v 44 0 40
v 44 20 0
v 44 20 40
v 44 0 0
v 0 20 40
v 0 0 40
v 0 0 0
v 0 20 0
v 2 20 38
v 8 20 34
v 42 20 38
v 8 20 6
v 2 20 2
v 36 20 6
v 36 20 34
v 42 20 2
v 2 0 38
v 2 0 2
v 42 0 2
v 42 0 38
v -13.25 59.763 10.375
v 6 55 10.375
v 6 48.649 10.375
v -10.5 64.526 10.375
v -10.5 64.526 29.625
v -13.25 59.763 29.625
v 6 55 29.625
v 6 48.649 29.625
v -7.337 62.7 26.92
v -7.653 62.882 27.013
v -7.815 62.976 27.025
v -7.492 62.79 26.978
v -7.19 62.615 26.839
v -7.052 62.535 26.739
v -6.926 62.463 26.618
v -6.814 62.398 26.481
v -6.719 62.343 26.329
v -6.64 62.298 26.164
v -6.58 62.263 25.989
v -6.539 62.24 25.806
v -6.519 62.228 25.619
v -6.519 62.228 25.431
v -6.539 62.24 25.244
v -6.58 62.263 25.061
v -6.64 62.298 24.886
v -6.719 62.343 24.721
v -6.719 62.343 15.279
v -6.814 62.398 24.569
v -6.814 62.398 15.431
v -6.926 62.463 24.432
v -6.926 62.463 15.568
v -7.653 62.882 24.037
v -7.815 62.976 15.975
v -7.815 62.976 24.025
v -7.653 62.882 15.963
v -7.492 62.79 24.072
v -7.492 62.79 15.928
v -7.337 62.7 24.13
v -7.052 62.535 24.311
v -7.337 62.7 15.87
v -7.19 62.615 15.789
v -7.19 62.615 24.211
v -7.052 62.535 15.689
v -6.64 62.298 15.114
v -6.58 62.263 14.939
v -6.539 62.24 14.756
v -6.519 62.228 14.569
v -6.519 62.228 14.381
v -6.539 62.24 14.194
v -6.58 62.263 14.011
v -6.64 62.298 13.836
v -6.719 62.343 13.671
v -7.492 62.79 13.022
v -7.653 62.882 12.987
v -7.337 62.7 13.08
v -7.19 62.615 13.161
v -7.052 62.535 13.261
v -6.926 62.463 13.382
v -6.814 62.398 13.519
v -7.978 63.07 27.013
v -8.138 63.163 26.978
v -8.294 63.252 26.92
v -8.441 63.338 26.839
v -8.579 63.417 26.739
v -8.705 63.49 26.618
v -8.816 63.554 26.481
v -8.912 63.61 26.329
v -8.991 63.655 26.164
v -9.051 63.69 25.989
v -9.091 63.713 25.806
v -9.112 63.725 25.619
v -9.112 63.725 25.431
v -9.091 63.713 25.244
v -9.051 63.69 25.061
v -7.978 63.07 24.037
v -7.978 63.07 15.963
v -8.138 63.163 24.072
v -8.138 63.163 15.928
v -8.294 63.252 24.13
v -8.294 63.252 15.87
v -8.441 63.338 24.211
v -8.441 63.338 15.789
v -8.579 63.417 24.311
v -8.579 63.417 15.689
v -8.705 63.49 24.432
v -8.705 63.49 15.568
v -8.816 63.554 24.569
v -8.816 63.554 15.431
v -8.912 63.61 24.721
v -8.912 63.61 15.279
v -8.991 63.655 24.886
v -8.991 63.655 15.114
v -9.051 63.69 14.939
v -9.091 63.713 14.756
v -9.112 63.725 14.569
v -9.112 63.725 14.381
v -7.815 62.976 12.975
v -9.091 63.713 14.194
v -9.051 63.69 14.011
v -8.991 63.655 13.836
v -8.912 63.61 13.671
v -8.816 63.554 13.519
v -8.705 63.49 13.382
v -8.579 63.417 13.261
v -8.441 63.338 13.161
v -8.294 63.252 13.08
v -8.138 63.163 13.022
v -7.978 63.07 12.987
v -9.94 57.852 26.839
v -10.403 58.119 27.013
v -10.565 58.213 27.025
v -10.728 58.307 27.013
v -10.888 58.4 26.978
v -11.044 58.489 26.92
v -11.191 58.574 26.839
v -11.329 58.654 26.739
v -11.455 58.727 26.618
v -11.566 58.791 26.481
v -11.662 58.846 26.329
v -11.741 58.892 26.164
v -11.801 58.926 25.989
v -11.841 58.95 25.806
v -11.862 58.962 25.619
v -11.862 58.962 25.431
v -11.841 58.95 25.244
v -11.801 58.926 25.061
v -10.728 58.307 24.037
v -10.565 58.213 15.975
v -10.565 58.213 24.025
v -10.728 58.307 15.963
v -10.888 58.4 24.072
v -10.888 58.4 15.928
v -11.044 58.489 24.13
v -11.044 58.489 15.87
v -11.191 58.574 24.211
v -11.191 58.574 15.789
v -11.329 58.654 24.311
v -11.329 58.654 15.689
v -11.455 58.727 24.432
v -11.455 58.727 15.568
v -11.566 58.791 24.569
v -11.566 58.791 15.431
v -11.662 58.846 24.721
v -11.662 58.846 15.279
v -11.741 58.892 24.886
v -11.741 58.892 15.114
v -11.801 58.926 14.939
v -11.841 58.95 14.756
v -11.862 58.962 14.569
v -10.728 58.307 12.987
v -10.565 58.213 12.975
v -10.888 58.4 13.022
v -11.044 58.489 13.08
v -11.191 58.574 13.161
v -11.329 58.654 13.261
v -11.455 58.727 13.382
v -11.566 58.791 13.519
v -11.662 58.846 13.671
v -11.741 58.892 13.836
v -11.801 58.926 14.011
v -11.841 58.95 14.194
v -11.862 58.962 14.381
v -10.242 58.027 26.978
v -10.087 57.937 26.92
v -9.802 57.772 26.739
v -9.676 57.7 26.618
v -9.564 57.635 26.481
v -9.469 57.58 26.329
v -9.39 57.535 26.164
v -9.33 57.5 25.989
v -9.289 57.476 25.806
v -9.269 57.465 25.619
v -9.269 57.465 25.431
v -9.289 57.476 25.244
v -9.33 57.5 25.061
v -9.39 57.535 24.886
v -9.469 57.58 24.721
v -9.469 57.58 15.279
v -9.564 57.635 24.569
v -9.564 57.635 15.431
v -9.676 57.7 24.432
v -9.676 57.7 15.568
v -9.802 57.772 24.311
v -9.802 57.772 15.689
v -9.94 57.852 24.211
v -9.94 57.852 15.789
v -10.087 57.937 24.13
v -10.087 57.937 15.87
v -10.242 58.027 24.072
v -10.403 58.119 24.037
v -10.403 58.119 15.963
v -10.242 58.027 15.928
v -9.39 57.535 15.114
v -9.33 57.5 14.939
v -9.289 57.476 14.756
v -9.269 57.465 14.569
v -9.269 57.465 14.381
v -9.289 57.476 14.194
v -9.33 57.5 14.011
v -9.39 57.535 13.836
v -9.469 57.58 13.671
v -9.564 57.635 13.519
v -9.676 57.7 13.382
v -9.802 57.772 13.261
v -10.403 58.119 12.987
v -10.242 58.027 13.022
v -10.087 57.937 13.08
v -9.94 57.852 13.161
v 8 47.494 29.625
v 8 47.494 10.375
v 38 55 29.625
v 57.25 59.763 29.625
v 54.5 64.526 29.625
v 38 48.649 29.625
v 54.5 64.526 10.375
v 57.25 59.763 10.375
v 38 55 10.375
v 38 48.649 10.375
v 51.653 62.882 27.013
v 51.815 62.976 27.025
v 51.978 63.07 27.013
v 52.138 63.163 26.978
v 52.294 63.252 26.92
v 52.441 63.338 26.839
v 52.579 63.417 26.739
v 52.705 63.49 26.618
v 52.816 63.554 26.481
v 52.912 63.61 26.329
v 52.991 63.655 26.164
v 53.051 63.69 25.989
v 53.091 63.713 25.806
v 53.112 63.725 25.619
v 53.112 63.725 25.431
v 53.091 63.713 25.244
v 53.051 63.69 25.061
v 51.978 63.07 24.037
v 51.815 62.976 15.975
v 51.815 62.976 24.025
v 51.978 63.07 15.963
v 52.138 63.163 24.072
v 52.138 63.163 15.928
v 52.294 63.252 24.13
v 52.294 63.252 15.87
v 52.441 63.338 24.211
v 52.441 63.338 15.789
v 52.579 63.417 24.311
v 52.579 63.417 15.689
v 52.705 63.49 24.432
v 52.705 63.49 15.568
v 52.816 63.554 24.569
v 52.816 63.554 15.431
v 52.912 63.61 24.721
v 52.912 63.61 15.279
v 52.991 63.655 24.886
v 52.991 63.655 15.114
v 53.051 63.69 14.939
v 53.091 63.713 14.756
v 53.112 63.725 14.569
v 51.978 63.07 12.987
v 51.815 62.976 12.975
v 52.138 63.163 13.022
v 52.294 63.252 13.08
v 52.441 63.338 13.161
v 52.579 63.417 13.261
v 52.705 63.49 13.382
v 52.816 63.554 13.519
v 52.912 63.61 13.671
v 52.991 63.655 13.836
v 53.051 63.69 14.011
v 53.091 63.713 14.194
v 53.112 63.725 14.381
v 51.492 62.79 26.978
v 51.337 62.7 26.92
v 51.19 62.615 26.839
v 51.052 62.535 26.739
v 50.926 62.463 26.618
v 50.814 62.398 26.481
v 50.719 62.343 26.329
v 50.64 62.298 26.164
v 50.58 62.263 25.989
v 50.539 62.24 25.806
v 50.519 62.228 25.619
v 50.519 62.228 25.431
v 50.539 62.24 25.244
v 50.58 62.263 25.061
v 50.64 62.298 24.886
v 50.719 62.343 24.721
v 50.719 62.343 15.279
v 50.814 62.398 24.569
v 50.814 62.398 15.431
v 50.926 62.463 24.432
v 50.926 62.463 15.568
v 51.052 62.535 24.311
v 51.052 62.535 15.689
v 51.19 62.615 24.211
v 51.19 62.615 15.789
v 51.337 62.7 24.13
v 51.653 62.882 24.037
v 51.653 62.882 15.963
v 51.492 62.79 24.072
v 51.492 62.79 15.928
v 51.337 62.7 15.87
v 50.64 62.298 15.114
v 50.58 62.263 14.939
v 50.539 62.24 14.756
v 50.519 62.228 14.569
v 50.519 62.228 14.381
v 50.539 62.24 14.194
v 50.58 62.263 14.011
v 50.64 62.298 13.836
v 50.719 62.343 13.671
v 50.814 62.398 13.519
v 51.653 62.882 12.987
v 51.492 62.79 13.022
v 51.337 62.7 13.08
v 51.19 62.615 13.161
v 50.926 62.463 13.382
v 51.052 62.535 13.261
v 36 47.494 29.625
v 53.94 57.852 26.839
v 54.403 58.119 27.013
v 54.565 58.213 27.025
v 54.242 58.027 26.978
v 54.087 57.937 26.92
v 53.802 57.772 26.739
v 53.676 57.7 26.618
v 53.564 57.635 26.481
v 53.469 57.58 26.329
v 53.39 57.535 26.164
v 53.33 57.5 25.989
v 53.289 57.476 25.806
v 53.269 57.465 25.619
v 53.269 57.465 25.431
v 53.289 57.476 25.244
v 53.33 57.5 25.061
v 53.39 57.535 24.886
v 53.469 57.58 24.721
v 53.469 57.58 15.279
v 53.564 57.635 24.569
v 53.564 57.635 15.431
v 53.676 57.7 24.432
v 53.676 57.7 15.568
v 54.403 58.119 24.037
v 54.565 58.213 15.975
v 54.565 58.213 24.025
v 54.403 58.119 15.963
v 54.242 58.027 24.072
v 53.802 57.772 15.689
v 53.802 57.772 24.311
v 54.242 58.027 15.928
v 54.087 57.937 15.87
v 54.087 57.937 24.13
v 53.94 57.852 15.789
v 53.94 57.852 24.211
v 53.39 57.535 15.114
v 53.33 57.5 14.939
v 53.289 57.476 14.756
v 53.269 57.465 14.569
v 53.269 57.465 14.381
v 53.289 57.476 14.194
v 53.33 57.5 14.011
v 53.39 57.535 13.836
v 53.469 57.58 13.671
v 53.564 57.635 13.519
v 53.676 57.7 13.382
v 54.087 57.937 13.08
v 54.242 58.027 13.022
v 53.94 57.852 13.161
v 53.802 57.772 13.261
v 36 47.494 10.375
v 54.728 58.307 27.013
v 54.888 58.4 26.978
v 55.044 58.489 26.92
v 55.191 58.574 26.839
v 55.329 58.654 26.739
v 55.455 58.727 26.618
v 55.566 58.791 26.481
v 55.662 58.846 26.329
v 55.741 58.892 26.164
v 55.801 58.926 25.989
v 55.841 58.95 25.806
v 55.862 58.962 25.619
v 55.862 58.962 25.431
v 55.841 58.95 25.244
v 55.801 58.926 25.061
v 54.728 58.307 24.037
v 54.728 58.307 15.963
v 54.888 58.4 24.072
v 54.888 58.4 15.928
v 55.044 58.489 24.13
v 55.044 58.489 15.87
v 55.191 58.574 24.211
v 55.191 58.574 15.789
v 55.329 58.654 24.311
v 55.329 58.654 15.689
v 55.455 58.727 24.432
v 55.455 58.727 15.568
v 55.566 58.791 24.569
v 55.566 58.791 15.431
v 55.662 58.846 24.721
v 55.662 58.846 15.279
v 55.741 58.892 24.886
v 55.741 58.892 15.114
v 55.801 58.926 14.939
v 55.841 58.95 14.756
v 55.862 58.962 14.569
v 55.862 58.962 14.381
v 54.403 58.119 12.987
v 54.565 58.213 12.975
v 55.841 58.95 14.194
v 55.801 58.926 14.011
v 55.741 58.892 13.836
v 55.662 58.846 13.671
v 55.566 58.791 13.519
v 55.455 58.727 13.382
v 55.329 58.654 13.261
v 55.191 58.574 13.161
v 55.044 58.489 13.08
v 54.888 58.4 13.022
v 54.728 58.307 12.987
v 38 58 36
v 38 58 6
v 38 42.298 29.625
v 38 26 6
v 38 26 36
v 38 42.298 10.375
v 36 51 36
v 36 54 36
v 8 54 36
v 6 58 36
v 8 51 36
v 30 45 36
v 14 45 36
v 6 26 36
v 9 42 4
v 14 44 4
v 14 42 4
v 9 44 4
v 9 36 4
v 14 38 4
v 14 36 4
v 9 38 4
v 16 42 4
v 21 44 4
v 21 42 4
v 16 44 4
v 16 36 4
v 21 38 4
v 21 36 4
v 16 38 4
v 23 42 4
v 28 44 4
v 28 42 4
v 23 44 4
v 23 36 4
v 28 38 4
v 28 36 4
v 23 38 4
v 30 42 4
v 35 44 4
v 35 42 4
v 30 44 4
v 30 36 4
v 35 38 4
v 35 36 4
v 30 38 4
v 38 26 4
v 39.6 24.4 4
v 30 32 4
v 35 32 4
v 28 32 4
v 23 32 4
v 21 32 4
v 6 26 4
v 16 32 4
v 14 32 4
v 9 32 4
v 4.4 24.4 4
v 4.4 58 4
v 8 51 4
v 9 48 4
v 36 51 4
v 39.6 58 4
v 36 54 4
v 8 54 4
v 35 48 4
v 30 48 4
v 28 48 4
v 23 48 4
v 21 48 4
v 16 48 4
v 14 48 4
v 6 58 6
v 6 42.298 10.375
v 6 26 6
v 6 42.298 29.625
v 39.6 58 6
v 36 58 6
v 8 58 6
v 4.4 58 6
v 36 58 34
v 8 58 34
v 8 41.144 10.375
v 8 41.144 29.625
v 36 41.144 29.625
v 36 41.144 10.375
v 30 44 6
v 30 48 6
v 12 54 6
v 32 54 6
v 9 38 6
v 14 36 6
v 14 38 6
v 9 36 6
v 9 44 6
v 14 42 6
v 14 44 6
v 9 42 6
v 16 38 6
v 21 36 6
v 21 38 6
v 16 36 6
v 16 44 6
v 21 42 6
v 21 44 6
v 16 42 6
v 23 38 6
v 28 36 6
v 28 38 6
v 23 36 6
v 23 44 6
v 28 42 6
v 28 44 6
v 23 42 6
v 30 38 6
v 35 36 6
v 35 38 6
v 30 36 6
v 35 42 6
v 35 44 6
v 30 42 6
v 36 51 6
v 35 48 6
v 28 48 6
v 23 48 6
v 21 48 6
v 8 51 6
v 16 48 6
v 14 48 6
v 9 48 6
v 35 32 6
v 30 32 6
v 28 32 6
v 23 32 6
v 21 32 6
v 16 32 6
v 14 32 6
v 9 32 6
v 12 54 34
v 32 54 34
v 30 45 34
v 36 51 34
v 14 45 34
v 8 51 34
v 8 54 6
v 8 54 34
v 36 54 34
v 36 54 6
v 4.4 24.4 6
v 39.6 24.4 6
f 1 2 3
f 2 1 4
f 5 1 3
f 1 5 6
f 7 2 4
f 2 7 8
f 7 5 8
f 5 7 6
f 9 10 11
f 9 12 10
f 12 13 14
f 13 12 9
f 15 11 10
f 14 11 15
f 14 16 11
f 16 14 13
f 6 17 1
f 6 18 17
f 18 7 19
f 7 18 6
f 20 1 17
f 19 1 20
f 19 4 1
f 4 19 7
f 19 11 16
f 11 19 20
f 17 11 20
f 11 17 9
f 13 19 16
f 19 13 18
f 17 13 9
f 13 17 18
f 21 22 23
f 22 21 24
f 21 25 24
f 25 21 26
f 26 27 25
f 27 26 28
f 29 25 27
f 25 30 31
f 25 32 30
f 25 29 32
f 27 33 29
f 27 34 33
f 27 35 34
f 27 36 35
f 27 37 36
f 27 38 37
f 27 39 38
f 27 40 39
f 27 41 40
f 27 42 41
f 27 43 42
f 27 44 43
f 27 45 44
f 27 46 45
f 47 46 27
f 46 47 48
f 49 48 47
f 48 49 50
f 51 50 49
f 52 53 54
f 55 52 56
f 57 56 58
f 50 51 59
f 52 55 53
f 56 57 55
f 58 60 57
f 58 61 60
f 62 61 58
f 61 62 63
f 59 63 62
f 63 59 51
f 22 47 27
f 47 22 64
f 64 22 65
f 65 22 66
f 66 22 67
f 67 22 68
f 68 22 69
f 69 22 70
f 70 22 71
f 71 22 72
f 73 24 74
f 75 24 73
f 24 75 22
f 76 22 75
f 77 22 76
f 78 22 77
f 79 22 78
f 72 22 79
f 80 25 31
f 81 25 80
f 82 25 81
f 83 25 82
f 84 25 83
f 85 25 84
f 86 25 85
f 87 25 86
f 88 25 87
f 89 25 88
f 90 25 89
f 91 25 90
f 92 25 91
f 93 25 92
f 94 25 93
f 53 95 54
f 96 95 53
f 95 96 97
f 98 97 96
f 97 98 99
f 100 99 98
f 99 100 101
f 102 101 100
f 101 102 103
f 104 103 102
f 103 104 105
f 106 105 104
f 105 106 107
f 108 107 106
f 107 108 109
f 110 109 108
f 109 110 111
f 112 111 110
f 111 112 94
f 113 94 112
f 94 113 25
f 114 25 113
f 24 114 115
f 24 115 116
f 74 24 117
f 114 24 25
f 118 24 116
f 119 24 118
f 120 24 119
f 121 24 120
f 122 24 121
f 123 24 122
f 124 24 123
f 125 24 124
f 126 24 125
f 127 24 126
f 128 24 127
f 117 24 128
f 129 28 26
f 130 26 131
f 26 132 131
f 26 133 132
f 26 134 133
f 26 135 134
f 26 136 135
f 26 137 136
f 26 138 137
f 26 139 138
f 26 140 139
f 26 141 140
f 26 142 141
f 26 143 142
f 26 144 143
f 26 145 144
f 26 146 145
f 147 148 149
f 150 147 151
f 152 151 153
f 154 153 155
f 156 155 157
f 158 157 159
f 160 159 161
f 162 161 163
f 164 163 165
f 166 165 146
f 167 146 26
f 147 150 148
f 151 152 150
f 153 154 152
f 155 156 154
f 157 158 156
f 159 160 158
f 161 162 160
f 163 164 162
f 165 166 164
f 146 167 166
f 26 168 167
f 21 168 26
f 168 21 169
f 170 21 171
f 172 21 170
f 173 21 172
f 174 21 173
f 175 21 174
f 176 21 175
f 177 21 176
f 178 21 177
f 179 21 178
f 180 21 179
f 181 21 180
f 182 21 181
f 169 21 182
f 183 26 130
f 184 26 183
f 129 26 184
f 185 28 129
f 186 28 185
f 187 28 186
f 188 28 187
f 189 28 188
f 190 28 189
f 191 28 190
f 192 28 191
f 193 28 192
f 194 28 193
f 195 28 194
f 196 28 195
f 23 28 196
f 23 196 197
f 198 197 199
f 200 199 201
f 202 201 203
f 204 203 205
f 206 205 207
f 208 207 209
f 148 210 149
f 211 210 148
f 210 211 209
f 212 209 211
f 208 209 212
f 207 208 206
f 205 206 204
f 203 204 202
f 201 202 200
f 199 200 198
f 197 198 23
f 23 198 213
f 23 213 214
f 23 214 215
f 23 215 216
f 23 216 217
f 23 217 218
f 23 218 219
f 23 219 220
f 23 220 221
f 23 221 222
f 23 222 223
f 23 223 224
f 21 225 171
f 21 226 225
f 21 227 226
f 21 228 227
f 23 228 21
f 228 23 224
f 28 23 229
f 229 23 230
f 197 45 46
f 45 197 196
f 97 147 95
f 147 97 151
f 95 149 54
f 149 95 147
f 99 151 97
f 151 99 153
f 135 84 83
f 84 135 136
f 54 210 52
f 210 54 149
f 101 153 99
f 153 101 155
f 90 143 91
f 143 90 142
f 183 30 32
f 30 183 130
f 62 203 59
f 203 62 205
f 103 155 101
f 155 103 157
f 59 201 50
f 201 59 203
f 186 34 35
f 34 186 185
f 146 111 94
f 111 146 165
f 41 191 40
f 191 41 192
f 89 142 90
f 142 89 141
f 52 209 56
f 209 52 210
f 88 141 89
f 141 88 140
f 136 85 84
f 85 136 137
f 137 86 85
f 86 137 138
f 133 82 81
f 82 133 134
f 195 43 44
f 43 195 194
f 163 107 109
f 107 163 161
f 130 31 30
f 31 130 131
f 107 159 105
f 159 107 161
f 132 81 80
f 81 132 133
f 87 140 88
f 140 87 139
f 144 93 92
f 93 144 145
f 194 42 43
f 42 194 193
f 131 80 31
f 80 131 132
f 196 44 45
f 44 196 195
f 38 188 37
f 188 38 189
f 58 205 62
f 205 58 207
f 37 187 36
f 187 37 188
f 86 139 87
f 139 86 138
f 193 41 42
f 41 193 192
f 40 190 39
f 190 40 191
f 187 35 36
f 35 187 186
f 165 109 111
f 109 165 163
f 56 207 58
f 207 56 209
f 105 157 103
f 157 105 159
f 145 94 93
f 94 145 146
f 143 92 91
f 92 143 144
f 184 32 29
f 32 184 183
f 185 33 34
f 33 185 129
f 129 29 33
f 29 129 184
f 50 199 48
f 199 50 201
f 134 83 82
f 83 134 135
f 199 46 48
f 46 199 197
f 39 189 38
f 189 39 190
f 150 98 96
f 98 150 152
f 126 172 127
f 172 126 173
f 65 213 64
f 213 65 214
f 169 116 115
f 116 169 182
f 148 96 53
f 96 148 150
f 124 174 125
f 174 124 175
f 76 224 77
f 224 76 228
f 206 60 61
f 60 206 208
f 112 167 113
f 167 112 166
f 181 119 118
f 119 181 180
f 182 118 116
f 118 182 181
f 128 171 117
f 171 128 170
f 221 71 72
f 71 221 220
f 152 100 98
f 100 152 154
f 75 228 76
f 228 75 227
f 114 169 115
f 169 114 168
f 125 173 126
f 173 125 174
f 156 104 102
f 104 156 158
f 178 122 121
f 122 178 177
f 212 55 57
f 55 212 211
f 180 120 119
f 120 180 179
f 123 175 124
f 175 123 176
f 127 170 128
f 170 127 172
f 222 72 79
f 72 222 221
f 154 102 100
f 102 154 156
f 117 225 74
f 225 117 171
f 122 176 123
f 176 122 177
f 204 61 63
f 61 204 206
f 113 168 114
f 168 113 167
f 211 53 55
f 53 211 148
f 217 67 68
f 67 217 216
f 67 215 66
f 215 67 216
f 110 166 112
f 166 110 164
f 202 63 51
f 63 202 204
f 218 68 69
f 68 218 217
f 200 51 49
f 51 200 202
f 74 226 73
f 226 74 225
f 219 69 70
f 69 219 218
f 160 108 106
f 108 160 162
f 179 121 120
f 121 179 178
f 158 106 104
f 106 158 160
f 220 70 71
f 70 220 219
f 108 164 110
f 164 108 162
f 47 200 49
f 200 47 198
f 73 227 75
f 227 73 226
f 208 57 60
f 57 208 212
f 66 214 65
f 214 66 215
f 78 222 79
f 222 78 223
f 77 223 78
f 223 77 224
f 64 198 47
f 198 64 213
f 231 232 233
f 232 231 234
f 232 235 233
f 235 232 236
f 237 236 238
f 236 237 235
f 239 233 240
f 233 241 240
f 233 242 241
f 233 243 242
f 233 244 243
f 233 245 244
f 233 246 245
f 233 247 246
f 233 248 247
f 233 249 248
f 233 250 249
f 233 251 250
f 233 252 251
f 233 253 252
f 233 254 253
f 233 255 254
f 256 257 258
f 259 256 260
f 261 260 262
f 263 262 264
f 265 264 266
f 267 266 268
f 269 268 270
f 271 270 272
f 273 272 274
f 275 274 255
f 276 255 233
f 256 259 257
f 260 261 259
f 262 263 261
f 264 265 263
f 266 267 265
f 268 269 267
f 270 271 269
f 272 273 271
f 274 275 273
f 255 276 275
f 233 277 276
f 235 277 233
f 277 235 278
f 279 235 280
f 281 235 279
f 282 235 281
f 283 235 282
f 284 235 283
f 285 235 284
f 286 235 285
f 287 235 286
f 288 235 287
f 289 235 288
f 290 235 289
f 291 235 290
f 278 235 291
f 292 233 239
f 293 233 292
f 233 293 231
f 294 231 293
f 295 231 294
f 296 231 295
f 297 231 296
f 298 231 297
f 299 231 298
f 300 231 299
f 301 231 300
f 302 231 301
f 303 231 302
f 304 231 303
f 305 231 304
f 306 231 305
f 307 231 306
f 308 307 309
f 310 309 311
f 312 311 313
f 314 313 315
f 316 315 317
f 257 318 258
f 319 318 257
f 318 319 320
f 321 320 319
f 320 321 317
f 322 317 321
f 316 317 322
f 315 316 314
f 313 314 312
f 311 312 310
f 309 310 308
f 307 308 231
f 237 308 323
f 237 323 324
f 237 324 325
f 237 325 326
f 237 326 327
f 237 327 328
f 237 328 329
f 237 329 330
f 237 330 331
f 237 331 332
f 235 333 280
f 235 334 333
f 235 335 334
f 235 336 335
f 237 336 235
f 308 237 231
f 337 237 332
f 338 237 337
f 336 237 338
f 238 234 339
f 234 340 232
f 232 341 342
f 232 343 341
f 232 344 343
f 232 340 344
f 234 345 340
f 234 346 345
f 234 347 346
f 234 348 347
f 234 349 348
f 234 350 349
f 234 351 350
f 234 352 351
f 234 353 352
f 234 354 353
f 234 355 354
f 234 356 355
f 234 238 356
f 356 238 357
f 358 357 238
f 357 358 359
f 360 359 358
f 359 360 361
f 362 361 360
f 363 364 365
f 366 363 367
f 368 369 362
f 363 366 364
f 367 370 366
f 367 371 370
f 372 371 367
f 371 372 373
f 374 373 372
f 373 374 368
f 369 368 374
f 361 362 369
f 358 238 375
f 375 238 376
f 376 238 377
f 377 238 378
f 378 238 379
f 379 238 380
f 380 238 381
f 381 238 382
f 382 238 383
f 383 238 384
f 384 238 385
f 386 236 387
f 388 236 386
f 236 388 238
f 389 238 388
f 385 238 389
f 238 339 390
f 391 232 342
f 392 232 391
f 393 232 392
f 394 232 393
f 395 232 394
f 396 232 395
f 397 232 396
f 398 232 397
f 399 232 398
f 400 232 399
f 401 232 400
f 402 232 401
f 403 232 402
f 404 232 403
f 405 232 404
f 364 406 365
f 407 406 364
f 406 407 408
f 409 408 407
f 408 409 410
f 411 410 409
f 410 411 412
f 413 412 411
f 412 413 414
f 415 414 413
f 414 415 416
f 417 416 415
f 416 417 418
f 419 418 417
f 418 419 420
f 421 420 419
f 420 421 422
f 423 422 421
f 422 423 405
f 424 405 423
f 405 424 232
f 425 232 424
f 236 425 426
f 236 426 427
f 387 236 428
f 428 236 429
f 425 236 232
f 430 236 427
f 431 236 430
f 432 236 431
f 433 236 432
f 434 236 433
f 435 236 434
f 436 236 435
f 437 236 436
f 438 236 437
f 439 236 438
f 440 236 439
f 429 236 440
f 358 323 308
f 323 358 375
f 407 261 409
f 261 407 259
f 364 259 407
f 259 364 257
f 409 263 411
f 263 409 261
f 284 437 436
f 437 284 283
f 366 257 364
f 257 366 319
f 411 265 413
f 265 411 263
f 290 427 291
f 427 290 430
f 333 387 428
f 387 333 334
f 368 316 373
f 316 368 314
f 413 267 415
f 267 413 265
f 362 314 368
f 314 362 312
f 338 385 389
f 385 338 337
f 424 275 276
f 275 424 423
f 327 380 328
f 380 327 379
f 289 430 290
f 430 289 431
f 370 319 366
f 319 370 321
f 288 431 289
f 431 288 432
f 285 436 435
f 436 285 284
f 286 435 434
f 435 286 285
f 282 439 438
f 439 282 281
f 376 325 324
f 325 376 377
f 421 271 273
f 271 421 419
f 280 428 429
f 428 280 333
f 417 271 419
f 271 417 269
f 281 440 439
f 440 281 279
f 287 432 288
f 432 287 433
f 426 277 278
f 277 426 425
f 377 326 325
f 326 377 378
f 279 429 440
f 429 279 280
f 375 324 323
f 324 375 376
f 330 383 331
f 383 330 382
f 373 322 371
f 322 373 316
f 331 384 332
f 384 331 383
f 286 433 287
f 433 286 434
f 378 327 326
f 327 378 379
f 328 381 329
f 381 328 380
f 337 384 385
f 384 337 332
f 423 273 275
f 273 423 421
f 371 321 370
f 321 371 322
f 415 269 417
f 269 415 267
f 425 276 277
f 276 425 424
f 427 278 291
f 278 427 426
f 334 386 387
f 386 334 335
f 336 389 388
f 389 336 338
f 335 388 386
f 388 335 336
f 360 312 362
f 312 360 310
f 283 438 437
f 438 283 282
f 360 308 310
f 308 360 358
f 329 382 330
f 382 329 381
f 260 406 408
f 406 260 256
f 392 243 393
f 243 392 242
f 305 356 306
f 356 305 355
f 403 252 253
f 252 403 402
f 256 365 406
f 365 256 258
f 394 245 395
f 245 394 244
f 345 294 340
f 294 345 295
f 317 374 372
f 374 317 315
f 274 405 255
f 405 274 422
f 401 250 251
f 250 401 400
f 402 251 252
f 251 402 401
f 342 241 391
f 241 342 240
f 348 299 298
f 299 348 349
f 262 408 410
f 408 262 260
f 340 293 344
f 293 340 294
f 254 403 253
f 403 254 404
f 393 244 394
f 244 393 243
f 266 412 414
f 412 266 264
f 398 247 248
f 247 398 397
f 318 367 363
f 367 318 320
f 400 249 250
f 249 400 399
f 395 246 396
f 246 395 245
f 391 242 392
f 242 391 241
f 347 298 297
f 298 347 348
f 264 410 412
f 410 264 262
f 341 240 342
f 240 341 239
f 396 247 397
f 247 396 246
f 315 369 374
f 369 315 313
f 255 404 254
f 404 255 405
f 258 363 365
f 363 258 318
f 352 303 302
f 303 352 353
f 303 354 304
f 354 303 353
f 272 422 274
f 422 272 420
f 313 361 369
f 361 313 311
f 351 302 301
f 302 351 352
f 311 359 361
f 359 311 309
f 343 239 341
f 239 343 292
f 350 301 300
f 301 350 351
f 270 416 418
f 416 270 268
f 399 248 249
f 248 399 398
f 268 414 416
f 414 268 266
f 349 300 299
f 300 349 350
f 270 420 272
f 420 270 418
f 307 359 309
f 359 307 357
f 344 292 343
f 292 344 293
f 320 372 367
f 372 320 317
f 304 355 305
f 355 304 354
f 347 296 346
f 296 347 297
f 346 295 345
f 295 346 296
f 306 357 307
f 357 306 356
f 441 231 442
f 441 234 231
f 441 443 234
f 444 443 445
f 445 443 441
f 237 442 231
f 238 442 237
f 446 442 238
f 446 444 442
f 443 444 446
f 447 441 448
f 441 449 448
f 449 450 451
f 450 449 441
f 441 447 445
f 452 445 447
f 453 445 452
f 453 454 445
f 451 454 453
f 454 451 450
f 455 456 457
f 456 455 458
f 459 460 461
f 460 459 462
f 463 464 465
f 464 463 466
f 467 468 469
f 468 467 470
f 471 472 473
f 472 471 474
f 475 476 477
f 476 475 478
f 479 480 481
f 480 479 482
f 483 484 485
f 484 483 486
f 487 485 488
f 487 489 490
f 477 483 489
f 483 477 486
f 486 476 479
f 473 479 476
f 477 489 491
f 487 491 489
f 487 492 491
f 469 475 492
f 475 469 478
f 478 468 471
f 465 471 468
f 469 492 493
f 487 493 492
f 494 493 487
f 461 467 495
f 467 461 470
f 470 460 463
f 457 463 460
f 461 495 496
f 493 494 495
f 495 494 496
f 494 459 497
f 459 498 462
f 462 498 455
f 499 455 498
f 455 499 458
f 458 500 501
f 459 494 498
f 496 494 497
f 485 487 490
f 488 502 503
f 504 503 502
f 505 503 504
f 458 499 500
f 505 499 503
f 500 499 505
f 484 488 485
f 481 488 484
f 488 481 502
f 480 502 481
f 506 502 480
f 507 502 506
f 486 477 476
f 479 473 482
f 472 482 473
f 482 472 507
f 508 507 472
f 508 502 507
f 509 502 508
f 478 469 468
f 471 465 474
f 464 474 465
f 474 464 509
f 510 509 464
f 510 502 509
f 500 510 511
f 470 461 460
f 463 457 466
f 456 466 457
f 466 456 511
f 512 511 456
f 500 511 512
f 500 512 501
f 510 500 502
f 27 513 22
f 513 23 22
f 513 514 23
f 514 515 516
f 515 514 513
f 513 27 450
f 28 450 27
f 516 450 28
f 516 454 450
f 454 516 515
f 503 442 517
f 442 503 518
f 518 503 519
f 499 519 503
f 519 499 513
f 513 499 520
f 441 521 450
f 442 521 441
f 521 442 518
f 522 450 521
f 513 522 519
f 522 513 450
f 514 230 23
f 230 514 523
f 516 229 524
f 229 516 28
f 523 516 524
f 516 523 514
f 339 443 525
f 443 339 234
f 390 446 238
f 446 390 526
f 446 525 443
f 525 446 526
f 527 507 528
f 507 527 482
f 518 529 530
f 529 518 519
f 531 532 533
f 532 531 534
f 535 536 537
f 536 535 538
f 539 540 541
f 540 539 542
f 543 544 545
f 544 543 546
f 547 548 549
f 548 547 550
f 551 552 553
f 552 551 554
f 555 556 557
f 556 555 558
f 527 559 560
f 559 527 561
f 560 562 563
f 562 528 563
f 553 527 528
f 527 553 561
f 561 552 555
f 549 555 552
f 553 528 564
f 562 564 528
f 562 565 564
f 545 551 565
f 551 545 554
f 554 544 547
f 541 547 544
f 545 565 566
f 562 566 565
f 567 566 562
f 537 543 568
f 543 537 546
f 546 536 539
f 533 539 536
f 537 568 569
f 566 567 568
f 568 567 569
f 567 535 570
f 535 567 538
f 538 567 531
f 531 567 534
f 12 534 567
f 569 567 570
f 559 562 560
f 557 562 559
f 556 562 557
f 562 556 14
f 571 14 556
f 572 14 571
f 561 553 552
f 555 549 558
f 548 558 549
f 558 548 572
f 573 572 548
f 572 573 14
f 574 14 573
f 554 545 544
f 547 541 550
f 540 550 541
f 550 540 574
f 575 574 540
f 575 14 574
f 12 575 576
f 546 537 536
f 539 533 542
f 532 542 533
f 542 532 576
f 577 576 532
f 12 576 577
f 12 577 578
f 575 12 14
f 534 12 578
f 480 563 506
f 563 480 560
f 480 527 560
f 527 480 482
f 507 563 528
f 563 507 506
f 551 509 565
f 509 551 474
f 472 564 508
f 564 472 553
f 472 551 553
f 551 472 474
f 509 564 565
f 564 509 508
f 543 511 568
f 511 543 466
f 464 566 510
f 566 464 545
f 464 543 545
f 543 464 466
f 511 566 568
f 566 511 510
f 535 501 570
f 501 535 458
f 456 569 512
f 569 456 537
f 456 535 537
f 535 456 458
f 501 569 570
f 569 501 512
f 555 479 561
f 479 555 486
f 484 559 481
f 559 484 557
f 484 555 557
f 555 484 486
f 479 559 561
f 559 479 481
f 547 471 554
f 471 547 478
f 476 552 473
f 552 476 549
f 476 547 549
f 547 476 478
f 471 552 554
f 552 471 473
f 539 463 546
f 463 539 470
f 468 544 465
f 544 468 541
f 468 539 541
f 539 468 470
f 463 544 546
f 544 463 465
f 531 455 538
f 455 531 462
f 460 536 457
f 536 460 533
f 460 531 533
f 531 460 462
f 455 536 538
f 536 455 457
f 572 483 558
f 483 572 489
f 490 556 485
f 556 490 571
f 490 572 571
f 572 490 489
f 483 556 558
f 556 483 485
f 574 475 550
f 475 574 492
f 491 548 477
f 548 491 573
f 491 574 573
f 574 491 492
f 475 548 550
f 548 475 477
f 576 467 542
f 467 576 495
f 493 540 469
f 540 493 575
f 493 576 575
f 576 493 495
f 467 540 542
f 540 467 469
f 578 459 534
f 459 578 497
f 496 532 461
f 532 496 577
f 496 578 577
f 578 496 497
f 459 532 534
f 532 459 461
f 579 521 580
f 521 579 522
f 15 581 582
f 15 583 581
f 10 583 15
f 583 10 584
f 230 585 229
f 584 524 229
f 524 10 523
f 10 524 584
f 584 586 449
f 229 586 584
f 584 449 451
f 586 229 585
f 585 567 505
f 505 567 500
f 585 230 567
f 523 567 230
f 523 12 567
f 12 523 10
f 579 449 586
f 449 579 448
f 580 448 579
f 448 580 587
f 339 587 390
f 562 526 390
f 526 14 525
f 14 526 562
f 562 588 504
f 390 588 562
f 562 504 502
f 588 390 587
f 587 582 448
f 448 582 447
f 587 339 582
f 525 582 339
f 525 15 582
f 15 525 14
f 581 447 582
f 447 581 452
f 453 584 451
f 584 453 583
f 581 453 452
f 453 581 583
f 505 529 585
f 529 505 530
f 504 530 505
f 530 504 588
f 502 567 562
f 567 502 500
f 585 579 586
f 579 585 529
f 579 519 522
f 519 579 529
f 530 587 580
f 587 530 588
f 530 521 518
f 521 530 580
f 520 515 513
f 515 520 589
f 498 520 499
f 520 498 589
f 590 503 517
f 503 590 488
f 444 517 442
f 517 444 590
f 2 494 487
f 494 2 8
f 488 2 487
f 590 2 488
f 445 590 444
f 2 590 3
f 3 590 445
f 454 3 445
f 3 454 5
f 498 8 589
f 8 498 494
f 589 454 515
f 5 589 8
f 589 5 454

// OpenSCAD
 //Variables
$fn = 50;
cube_design = "corpus_brush"; //corpus, corpus_brush, darkener or funnel
grid_pattern = "squares"; //squares, squares2 (rotated by 45°)
plexi_cube_width = 39; //39 for cube1, 32 for cube2
plexi_cube_length = 35; //35 for cube1, 30 for cube2
plexi_cube_depth_overall = 30;
darkener_overhang = 10;
plexi_cube_depth = 20; //this is for the main corpus
plexi_cube_thickness = 2;
plexi_cube_buffer = 0.5; //1mm room in every direction
insert_bar_height = 6; //needs to be the same as in the insert creator
insert_bar_length = 16; //needs to be the same as in the insert creator
insert_base_length = 28; //needs to be the same as "base plate length upper" in the insert creator
insert_thickness = 2; //needs to be the same as "base plate thickness" in the insert creator
insert_buffer = 1;
insert_distance_from_tube_end = 4; //dont change this

tube_thickness = 2;

tube_width = 28;
tube_length = 28;
tube_depth = 32; // was 38.5, for normal design 25.5, increase for brush
tube_count = 1; //number of tubes

security_bar_width = 4; //dont change this

slide_bar_length = tube_depth+2;
slide_bar_width = 1.6; //decreased from 2 to 1,6 for buffer
slide_bar_height = 2;
//if square grid pattern

square_width = 5;
square_length = 4;
square_distance = 2;
number_squares_per_row = 4;
number_squares_per_column = 3; // normal 2, brush probably 3

funnel_slide_width = 4;
funnel_slide_height = 7;
funnel_slide_hollow_height = 3;
funnel_slide_buffer_width = 0.2;
funnel_pyramid_length = 32;
funnel_pyramid_tip_height = 18;
funnel_tip_cube_width = 14;
funnel_tip_cube_length = 14;
funnel_tip_cube_height = 11;
funnel_hollow_cylinder_height = 20;
funnel_hollow_cylinder_diameter = 7;

brush_head_length = 16;
brush_bottom_length = 24;
brush_width = 19.25;
brush_thickness = 5.5;
distance_hole_from_top = 1.6;
distance_hole_from_side = 2.6;
diameter = 3;


//angle
tube_distance_left = (plexi_cube_width/2+plexi_cube_buffer+plexi_cube_thickness-tube_width/2-tube_thickness);
tube_distance_bottom = (plexi_cube_length/2+plexi_cube_buffer+plexi_cube_thickness-tube_length/2-tube_thickness);
angle_depth = max(tube_distance_left, tube_distance_bottom);
outer_cube_width = plexi_cube_width + 2*plexi_cube_thickness + 2*plexi_cube_buffer;
outer_cube_length = plexi_cube_length + 2*plexi_cube_thickness + 2*plexi_cube_buffer;

//module to create triangles
module triangle(width,length,height){
    difference(){
        cube([width,length,height]);
        rotate([0,0,45]) cube([width*2.5,length*2.5,height*5]);
    }
}

//module to show points of a polyhedron
module showPoints(v) {
    for (i = [0: len(v)-1]) {
        translate(v[i]) color("red") 
        text(str(i), font = "Courier New", size=1.5);
         
    }
}

//module to create a square grid pattern
module square_grid(){
    grid_width = square_width*number_squares_per_row + square_distance*(number_squares_per_row-1);
    grid_length = square_length*number_squares_per_column + square_distance*(number_squares_per_column-1);
translate([tube_width/2+tube_thickness-grid_width/2,tube_depth+angle_depth-(insert_distance_from_tube_end+insert_thickness+insert_buffer+insert_bar_height)+3,0])
translate([grid_width,0,0])
rotate([0,0,180])
for (j=[0:number_squares_per_column-1]){
for (i=[0:number_squares_per_row-1]){
    translate([i*(square_distance+square_width),j*(square_distance+square_length),0])cube([square_width,square_length,tube_thickness]);
    }
}
}

module square_grid2(){
    grid_width = square_width*number_squares_per_row + square_distance*(number_squares_per_row-1);
    grid_length = square_length*number_squares_per_column + square_distance*(number_squares_per_column-1);
translate([tube_width/2+tube_thickness-grid_width/2,tube_depth+angle_depth-(insert_distance_from_tube_end+insert_thickness+insert_buffer+insert_bar_height),0])
translate([grid_width-square_length/2,0,0])
rotate([0,0,180])
for (j=[0:number_squares_per_column-1]){
for (i=[0:number_squares_per_row-1]){
    translate([i*(square_distance+square_width),j*(square_distance+square_length),0])rotate([0,0,45])cube([square_width,square_length,tube_thickness]);
    }
}
}

//module to create a brush as a standin
module brush (){
difference(){
union(){
color("green")cube([brush_width, brush_thickness, brush_head_length]);
color("brown")translate([0,0,brush_head_length])cube([brush_width, brush_thickness, brush_bottom_length]);
}

union(){
translate([diameter/2+distance_hole_from_side,0,diameter/2 + distance_hole_from_top])rotate([270,0,0])cylinder(h=brush_thickness, d=diameter);
translate([brush_width-diameter/2-distance_hole_from_side,0,diameter/2 + distance_hole_from_top])rotate([270,0,0])cylinder(h=brush_thickness, d=diameter);
}
}
}

//module to create a mount for the brush
module brush_mount (){
difference(){
union(){
color("green")cube([brush_width, brush_thickness, brush_head_length]);
color("brown")translate([0,0,brush_head_length])cube([brush_width, brush_thickness, brush_bottom_length]);
}

union(){
translate([diameter/2+distance_hole_from_side,0,diameter/2 + distance_hole_from_top])rotate([270,0,0])cylinder(h=brush_thickness, d=diameter);
translate([brush_width-diameter/2-distance_hole_from_side,0,diameter/2 + distance_hole_from_top])rotate([270,0,0])cylinder(h=brush_thickness, d=diameter);
}
}
}


if (cube_design == "corpus"){
union(){

//plexi_cube part of the tube
difference(){
    cube([plexi_cube_width + 2*plexi_cube_thickness + 2*plexi_cube_buffer, plexi_cube_depth, plexi_cube_length+2*plexi_cube_thickness + 2*plexi_cube_buffer]);
    translate([plexi_cube_thickness,0,plexi_cube_thickness])cube([plexi_cube_width + 2*plexi_cube_buffer, plexi_cube_depth, plexi_cube_length + 2*plexi_cube_buffer]);
}

//angle
angle_points = [
    [0,0,0], //0
    [outer_cube_width,0,0],//1
    [outer_cube_width,0,outer_cube_length],//2
    [0,0,outer_cube_length],//3
    [tube_distance_left,0,tube_distance_bottom],//4
    [outer_cube_width-tube_distance_left,0,tube_distance_bottom],//5
    [outer_cube_width-tube_distance_left,0,outer_cube_length-tube_distance_bottom],//6
    [tube_distance_left,0,outer_cube_length-tube_distance_bottom],//7
    [tube_distance_left,angle_depth,tube_distance_bottom],//8
    [outer_cube_width-tube_distance_left,angle_depth,tube_distance_bottom],//9
    [outer_cube_width-tube_distance_left,angle_depth,outer_cube_length-tube_distance_bottom],//10
    [tube_distance_left,angle_depth,outer_cube_length-tube_distance_bottom],//11
    
];

*showPoints(angle_points);
angle_faces = [
    [1,0,4,5],
    [0,1,9,8],
    [5,4,8,9],
    [2,1,5,6],
    [1,2,10,9],
    [6,5,9,10],
    [3,2,6,7],
    [2,3,11,10],
    [7,6,10,11],
    [0,3,7,4],
    [3,0,8,11],
    [4,7,11,8],
];


translate([0,plexi_cube_depth,0])
polyhedron(angle_points, angle_faces);



//tube
translate([plexi_cube_width/2-tube_width/2 + plexi_cube_buffer,plexi_cube_depth ,plexi_cube_length/2-tube_length/2 + plexi_cube_buffer]) 
for(i=[0:tube_count-1]){
if (i==0){
translate([0,tube_depth*i,0])    
union(){
difference(){
    cube([tube_width+2*tube_thickness, tube_depth + angle_depth, tube_length + 2*tube_thickness]);
    translate([tube_thickness,0,tube_thickness])cube([tube_width, tube_depth + angle_depth, tube_length]);
    

insert_slot_upper_points = [
    [0,0,0], //0
    [insert_base_length,0,0],//1
    [insert_base_length,insert_thickness + insert_buffer, 0],//2
    [insert_base_length/2 + insert_bar_length/2,insert_thickness + insert_buffer + insert_bar_height,0],//3
    [insert_base_length/2 - insert_bar_length/2,insert_thickness + insert_buffer + insert_bar_height,0],//4
    [0,insert_thickness + insert_buffer, 0],//5
    [0,0,tube_thickness], //6
    [insert_base_length,0,tube_thickness],//7
    [insert_base_length,insert_thickness + insert_buffer, tube_thickness],//8
    [insert_base_length/2 + insert_bar_length/2,insert_thickness + insert_buffer + insert_bar_height,tube_thickness],//9
    [insert_base_length/2 - insert_bar_length/2,insert_thickness + insert_buffer + insert_bar_height,tube_thickness],//10
    [0,insert_thickness + insert_buffer, tube_thickness],//11
];

*showPoints(insert_slot_upper_points);

insert_slot_upper_faces = [
    [0,1,2,3,4,5],
    [0,5,11,6],
    [5,4,10,11],
    [4,3,9,10],
    [3,2,8,9],
    [2,1,7,8],
    [1,0,6,7],
    [11,10,9,8,7,6]
];

translate([tube_width/2+tube_thickness-insert_base_length/2,tube_depth+angle_depth-(insert_bar_height+insert_thickness+insert_buffer)-insert_distance_from_tube_end,tube_length+tube_thickness])translate([insert_base_length,insert_bar_height + insert_thickness + insert_buffer,0])rotate([0,0,180])polyhedron(insert_slot_upper_points,insert_slot_upper_faces);

translate([tube_width/2+tube_thickness-insert_base_length/2,tube_depth+angle_depth-(insert_thickness+insert_buffer)-insert_distance_from_tube_end,0])cube([insert_base_length,insert_thickness+insert_buffer,tube_thickness]);


if (grid_pattern == "squares") square_grid();
else if (grid_pattern == "squares2") square_grid2();   
    
}

//security_bar
translate([tube_thickness,tube_depth+angle_depth-insert_distance_from_tube_end,tube_thickness])translate([0,insert_distance_from_tube_end,0])rotate([0,0,270])triangle(insert_distance_from_tube_end,security_bar_width,tube_length);
translate([tube_width-tube_thickness,tube_depth+angle_depth-insert_distance_from_tube_end,tube_thickness])triangle(insert_distance_from_tube_end,security_bar_width,tube_length);

//slide bar
translate([-slide_bar_width,tube_depth+angle_depth-slide_bar_length,0])
color("red"){cube([slide_bar_width,slide_bar_length,slide_bar_height]); 
}
translate([tube_width+2*tube_thickness,tube_depth+angle_depth-slide_bar_length,0])
color("red"){cube([slide_bar_width,slide_bar_length,slide_bar_height]); 
}

}
}
else if (i<tube_count-1){
translate([0,tube_depth*i,0])    
union(){
difference(){
    translate([0,angle_depth,0])
    cube([tube_width+2*tube_thickness, tube_depth , tube_length + 2*tube_thickness]);
    translate([tube_thickness,0,tube_thickness])cube([tube_width, tube_depth + angle_depth, tube_length]);
    

insert_slot_upper_points = [
    [0,0,0], //0
    [insert_base_length,0,0],//1
    [insert_base_length,insert_thickness + insert_buffer, 0],//2
    [insert_base_length/2 + insert_bar_length/2,insert_thickness + insert_buffer + insert_bar_height,0],//3
    [insert_base_length/2 - insert_bar_length/2,insert_thickness + insert_buffer + insert_bar_height,0],//4
    [0,insert_thickness + insert_buffer, 0],//5
    [0,0,tube_thickness], //6
    [insert_base_length,0,tube_thickness],//7
    [insert_base_length,insert_thickness + insert_buffer, tube_thickness],//8
    [insert_base_length/2 + insert_bar_length/2,insert_thickness + insert_buffer + insert_bar_height,tube_thickness],//9
    [insert_base_length/2 - insert_bar_length/2,insert_thickness + insert_buffer + insert_bar_height,tube_thickness],//10
    [0,insert_thickness + insert_buffer, tube_thickness],//11
];

*showPoints(insert_slot_upper_points);

insert_slot_upper_faces = [
    [0,1,2,3,4,5],
    [0,5,11,6],
    [5,4,10,11],
    [4,3,9,10],
    [3,2,8,9],
    [2,1,7,8],
    [1,0,6,7],
    [11,10,9,8,7,6]
];

translate([tube_width/2+tube_thickness-insert_base_length/2,tube_depth+angle_depth-(insert_bar_height+insert_thickness+insert_buffer)-insert_distance_from_tube_end,tube_length+tube_thickness])translate([insert_base_length,insert_bar_height + insert_thickness + insert_buffer,0])rotate([0,0,180])polyhedron(insert_slot_upper_points,insert_slot_upper_faces);

translate([tube_width/2+tube_thickness-insert_base_length/2,tube_depth+angle_depth-(insert_thickness+insert_buffer)-insert_distance_from_tube_end,0])cube([insert_base_length,insert_thickness+insert_buffer,tube_thickness]);


if (grid_pattern == "squares") square_grid();
else if (grid_pattern == "squares2") square_grid2();   
    
}

//security_bar
translate([tube_thickness,tube_depth+angle_depth-insert_distance_from_tube_end,tube_thickness])translate([0,insert_distance_from_tube_end,0])rotate([0,0,270])triangle(insert_distance_from_tube_end,security_bar_width,tube_length);
translate([tube_width-tube_thickness,tube_depth+angle_depth-insert_distance_from_tube_end,tube_thickness])triangle(insert_distance_from_tube_end,security_bar_width,tube_length);

//slide bar
translate([-slide_bar_width,tube_depth+angle_depth-slide_bar_length,0])
color("red"){cube([slide_bar_width,slide_bar_length,slide_bar_height]); 
}
translate([tube_width+2*tube_thickness,tube_depth+angle_depth-slide_bar_length,0])
color("red"){cube([slide_bar_width,slide_bar_length,slide_bar_height]); 
}

}
}
else if (i==tube_count-1){
translate([0,tube_depth*i,0])    
union(){
difference(){
    translate([0,angle_depth,0])
    cube([tube_width+2*tube_thickness, tube_depth , tube_length + 2*tube_thickness]);
    translate([tube_thickness,0,tube_thickness])cube([tube_width, tube_depth + angle_depth, tube_length]);
    
//insert_slot
insert_slot_upper_points = [
    [0,0,0], //0
    [insert_base_length,0,0],//1
    [insert_base_length,insert_thickness + insert_buffer, 0],//2
    [insert_base_length/2 + insert_bar_length/2,insert_thickness + insert_buffer + insert_bar_height,0],//3
    [insert_base_length/2 - insert_bar_length/2,insert_thickness + insert_buffer + insert_bar_height,0],//4
    [0,insert_thickness + insert_buffer, 0],//5
    [0,0,tube_thickness], //6
    [insert_base_length,0,tube_thickness],//7
    [insert_base_length,insert_thickness + insert_buffer, tube_thickness],//8
    [insert_base_length/2 + insert_bar_length/2,insert_thickness + insert_buffer + insert_bar_height,tube_thickness],//9
    [insert_base_length/2 - insert_bar_length/2,insert_thickness + insert_buffer + insert_bar_height,tube_thickness],//10
    [0,insert_thickness + insert_buffer, tube_thickness],//11
];

*showPoints(insert_slot_upper_points);

insert_slot_upper_faces = [
    [0,1,2,3,4,5],
    [0,5,11,6],
    [5,4,10,11],
    [4,3,9,10],
    [3,2,8,9],
    [2,1,7,8],
    [1,0,6,7],
    [11,10,9,8,7,6]
];

translate([tube_width/2+tube_thickness-insert_base_length/2,tube_depth+angle_depth-(insert_bar_height+insert_thickness+insert_buffer)-insert_distance_from_tube_end,tube_length+tube_thickness])translate([insert_base_length,insert_bar_height + insert_thickness + insert_buffer,0])rotate([0,0,180])polyhedron(insert_slot_upper_points,insert_slot_upper_faces);

translate([tube_width/2+tube_thickness-insert_base_length/2,tube_depth+angle_depth-(insert_thickness+insert_buffer)-insert_distance_from_tube_end,0])cube([insert_base_length,insert_thickness+insert_buffer,tube_thickness]);


if (grid_pattern == "squares") square_grid();
else if (grid_pattern == "squares2") square_grid2();   
    
}
//security_bar
translate([tube_thickness,tube_depth+angle_depth-insert_distance_from_tube_end,tube_thickness])cube([security_bar_width,insert_distance_from_tube_end,tube_length]);
translate([tube_width-tube_thickness,tube_depth+angle_depth-insert_distance_from_tube_end,tube_thickness])cube([security_bar_width,insert_distance_from_tube_end,tube_length]);
//slide_bar
translate([-slide_bar_width,tube_depth+angle_depth-slide_bar_length,0])
color("red"){cube([slide_bar_width,slide_bar_length,slide_bar_height]); 
}
translate([tube_width+2*tube_thickness,tube_depth+angle_depth-slide_bar_length,0])
color("red"){cube([slide_bar_width,slide_bar_length,slide_bar_height]); 

}
}
}
}
}
}
// -----------------------------------------
if (cube_design == "corpus_brush"){
union(){

//plexi_cube part of the tube
difference(){
    cube([plexi_cube_width + 2*plexi_cube_thickness + 2*plexi_cube_buffer, plexi_cube_depth, plexi_cube_length+2*plexi_cube_thickness + 2*plexi_cube_buffer]);
    translate([plexi_cube_thickness,0,plexi_cube_thickness])cube([plexi_cube_width + 2*plexi_cube_buffer, plexi_cube_depth, plexi_cube_length + 2*plexi_cube_buffer]);
}

//angle
angle_points = [
    [0,0,0], //0
    [outer_cube_width,0,0],//1
    [outer_cube_width,0,outer_cube_length],//2
    [0,0,outer_cube_length],//3
    [tube_distance_left,0,tube_distance_bottom],//4
    [outer_cube_width-tube_distance_left,0,tube_distance_bottom],//5
    [outer_cube_width-tube_distance_left,0,outer_cube_length-tube_distance_bottom],//6
    [tube_distance_left,0,outer_cube_length-tube_distance_bottom],//7
    [tube_distance_left,angle_depth,tube_distance_bottom],//8
    [outer_cube_width-tube_distance_left,angle_depth,tube_distance_bottom],//9
    [outer_cube_width-tube_distance_left,angle_depth,outer_cube_length-tube_distance_bottom],//10
    [tube_distance_left,angle_depth,outer_cube_length-tube_distance_bottom],//11
    
];

*showPoints(angle_points);
angle_faces = [
    [1,0,4,5],
    [0,1,9,8],
    [5,4,8,9],
    [2,1,5,6],
    [1,2,10,9],
    [6,5,9,10],
    [3,2,6,7],
    [2,3,11,10],
    [7,6,10,11],
    [0,3,7,4],
    [3,0,8,11],
    [4,7,11,8],
];


translate([0,plexi_cube_depth,0])
polyhedron(angle_points, angle_faces);



//tube
translate([plexi_cube_width/2-tube_width/2 + plexi_cube_buffer,plexi_cube_depth ,plexi_cube_length/2-tube_length/2 + plexi_cube_buffer]) 

union(){
difference(){
    union(){
    cube([tube_width+2*tube_thickness, tube_depth + angle_depth, tube_length + 2*tube_thickness]);
        
    //Brush mounts
translate([-(plexi_cube_width/2-tube_width/2 + plexi_cube_buffer),-(plexi_cube_depth) ,-(plexi_cube_length/2-tube_length/2 + plexi_cube_buffer)]) translate([0,plexi_cube_width+tube_depth/2,((plexi_cube_length+2*plexi_cube_thickness+2*plexi_cube_buffer)-brush_width)/2])translate([-brush_head_length,0,brush_width])rotate([30,90,0])translate([0,brush_thickness,0])brush_mount();

translate([-(plexi_cube_width/2-tube_width/2 + plexi_cube_buffer),-(plexi_cube_depth) ,-(plexi_cube_length/2-tube_length/2 + plexi_cube_buffer)])translate([0,plexi_cube_width+tube_depth/2,((plexi_cube_length+2*plexi_cube_thickness+2*plexi_cube_buffer)-brush_width)/2])translate([+brush_head_length,0,brush_width])translate([plexi_cube_width+2*plexi_cube_thickness + 2*plexi_cube_buffer,0,-brush_width])rotate([0,180,0])rotate([30,90,0])translate([0,brush_thickness,0])brush_mount();
    }
    insert_slot_upper_points = [
    [0,0,0], //0
    [insert_base_length,0,0],//1
    [insert_base_length,insert_thickness + insert_buffer, 0],//2
    [insert_base_length/2 + insert_bar_length/2,insert_thickness + insert_buffer + insert_bar_height,0],//3
    [insert_base_length/2 - insert_bar_length/2,insert_thickness + insert_buffer + insert_bar_height,0],//4
    [0,insert_thickness + insert_buffer, 0],//5
    [0,0,tube_thickness], //6
    [insert_base_length,0,tube_thickness],//7
    [insert_base_length,insert_thickness + insert_buffer, tube_thickness],//8
    [insert_base_length/2 + insert_bar_length/2,insert_thickness + insert_buffer + insert_bar_height,tube_thickness],//9
    [insert_base_length/2 - insert_bar_length/2,insert_thickness + insert_buffer + insert_bar_height,tube_thickness],//10
    [0,insert_thickness + insert_buffer, tube_thickness],//11
];

*showPoints(insert_slot_upper_points);

insert_slot_upper_faces = [
    [0,1,2,3,4,5],
    [0,5,11,6],
    [5,4,10,11],
    [4,3,9,10],
    [3,2,8,9],
    [2,1,7,8],
    [1,0,6,7],
    [11,10,9,8,7,6]
];

translate([tube_width/2+tube_thickness-insert_base_length/2,tube_depth+angle_depth-(insert_bar_height+insert_thickness+insert_buffer)-insert_distance_from_tube_end,tube_length+tube_thickness])translate([insert_base_length,insert_bar_height + insert_thickness + insert_buffer,0])rotate([0,0,180])polyhedron(insert_slot_upper_points,insert_slot_upper_faces);

translate([tube_width/2+tube_thickness-insert_base_length/2,tube_depth+angle_depth-(insert_thickness+insert_buffer)-insert_distance_from_tube_end,0])cube([insert_base_length,insert_thickness+insert_buffer,tube_thickness]);

    translate([tube_thickness,0,tube_thickness])cube([tube_width, tube_depth + angle_depth, tube_length]);
    
    //Brushes for to get the spacing right
translate([-(plexi_cube_width/2-tube_width/2 + plexi_cube_buffer),-(plexi_cube_depth) ,-(plexi_cube_length/2-tube_length/2 + plexi_cube_buffer)])translate([0,plexi_cube_width+tube_depth/2,((plexi_cube_length+2*plexi_cube_thickness+2*plexi_cube_buffer)-brush_width)/2])translate([-brush_head_length,0,brush_width])rotate([30,90,0])brush();

translate([-(plexi_cube_width/2-tube_width/2 + plexi_cube_buffer),-(plexi_cube_depth) ,-(plexi_cube_length/2-tube_length/2 + plexi_cube_buffer)])translate([0,plexi_cube_width+tube_depth/2,((plexi_cube_length+2*plexi_cube_thickness+2*plexi_cube_buffer)-brush_width)/2])translate([+brush_head_length,0,brush_width])translate([plexi_cube_width+2*plexi_cube_thickness + 2*plexi_cube_buffer,0,-brush_width])rotate([0,180,0])rotate([30,90,0])brush();

    
if (grid_pattern == "squares") square_grid();
else if (grid_pattern == "squares2") square_grid2();   
}

//security_bar
translate([tube_thickness,tube_depth+angle_depth-insert_distance_from_tube_end,tube_thickness])translate([0,insert_distance_from_tube_end,0])rotate([0,0,270])triangle(insert_distance_from_tube_end,security_bar_width,tube_length);
translate([tube_width-tube_thickness,tube_depth+angle_depth-insert_distance_from_tube_end,tube_thickness])triangle(insert_distance_from_tube_end,security_bar_width,tube_length);


//slide bar
translate([-slide_bar_width,tube_depth+angle_depth-slide_bar_length,0])
color("red"){cube([slide_bar_width,slide_bar_length,slide_bar_height]); 
}
translate([tube_width+2*tube_thickness,tube_depth+angle_depth-slide_bar_length,0])
color("red"){cube([slide_bar_width,slide_bar_length,slide_bar_height]); 
}
}
}
}




// darkener
else if (cube_design == "darkener"){
darkener_top_width = plexi_cube_width+2*plexi_cube_thickness+2*plexi_cube_buffer;
darkener_top_depth = plexi_cube_depth_overall-plexi_cube_depth+plexi_cube_thickness;
darkener_top_length = plexi_cube_length+2*plexi_cube_thickness+2*plexi_cube_buffer;
darkener_bottom_width = plexi_cube_width+4*plexi_cube_thickness+4*plexi_cube_buffer;
darkener_bottom_depth = darkener_overhang+2*plexi_cube_thickness;
darkener_bottom_length = plexi_cube_length+4*plexi_cube_thickness+4*plexi_cube_buffer;

difference(){
cube([darkener_bottom_width,darkener_top_depth,darkener_bottom_length]);
translate([2*plexi_cube_thickness+2*plexi_cube_buffer,plexi_cube_thickness,2*plexi_cube_thickness+2*plexi_cube_buffer])cube([darkener_top_width-2*plexi_cube_thickness,darkener_top_depth-plexi_cube_thickness,darkener_top_length - 2*plexi_cube_thickness]);
}
    

translate([0,darkener_top_depth,0])difference(){
cube([darkener_bottom_width,darkener_bottom_depth,darkener_bottom_length]);
translate([plexi_cube_thickness+plexi_cube_buffer,0,plexi_cube_thickness+plexi_cube_buffer]) cube([plexi_cube_width+2*plexi_cube_thickness+3*plexi_cube_buffer,darkener_overhang+2*plexi_cube_thickness,plexi_cube_length+2*plexi_cube_thickness+3*plexi_cube_buffer]);

}
}

else if (cube_design == "funnel"){
    funnel_slide_length = tube_count * tube_depth - 8;
    translate([0,funnel_pyramid_length+funnel_slide_width,0])
    difference(){
    cube([funnel_slide_length, funnel_slide_width, funnel_slide_height]);
    translate([0,0,2])cube([funnel_slide_length,funnel_slide_width/2, funnel_slide_hollow_height]);
    cube([funnel_slide_length, funnel_slide_buffer_width,2]);
    }
    translate([0,funnel_slide_width,0])mirror([0,1,0])difference(){
    cube([funnel_slide_length, funnel_slide_width, funnel_slide_height]);
    translate([0,0,2])cube([funnel_slide_length,funnel_slide_width/2, funnel_slide_hollow_height]);
    cube([funnel_slide_length, funnel_slide_buffer_width,2]);
    }
    
    
    funnel_pyramid_points = [
    [funnel_slide_length, funnel_pyramid_length,0],
    [funnel_slide_length,0,0],
    [0,0,0],
    [0,funnel_pyramid_length,0],
    [funnel_slide_length/2,funnel_pyramid_length/2,funnel_pyramid_tip_height]];
    
    funnel_pyramid_faces = [
    [0,1,4],
    [1,2,4],
    [2,3,4],
    [3,0,4],
    [1,0,3],
    [2,1,3]];
    
    funnel_pyramid_points_hollow = [
    [funnel_slide_length, funnel_pyramid_length,-2],
    [funnel_slide_length,0,-2],
    [0,0,-2],
    [0,funnel_pyramid_length,-2],
    [funnel_slide_length/2,funnel_pyramid_length/2,funnel_pyramid_tip_height-1]];
    
    funnel_pyramid_faces_hollow = [
    [0,1,4],
    [1,2,4],
    [2,3,4],
    [3,0,4],
    [1,0,3],
    [2,1,3]];
    
    difference(){
    union(){translate([0,funnel_slide_width,funnel_slide_height-2])cube([funnel_slide_length,funnel_pyramid_length, 2]);
    translate([0,funnel_slide_width,funnel_slide_height])polyhedron(funnel_pyramid_points, funnel_pyramid_faces);
    translate([funnel_slide_length/2-funnel_tip_cube_length/2,(funnel_pyramid_length+2*funnel_slide_width)/2-funnel_tip_cube_width/2,funnel_pyramid_tip_height+funnel_slide_height-funnel_tip_cube_height-1])cube([funnel_tip_cube_width, funnel_tip_cube_length, funnel_tip_cube_height]);
    }
    union(){
    color("red")translate([0,funnel_slide_width,funnel_slide_height])polyhedron(funnel_pyramid_points_hollow, funnel_pyramid_faces_hollow);
    
    translate([funnel_slide_length/2,funnel_pyramid_length/2 + funnel_slide_width,10])color("turquoise")cylinder(h=funnel_hollow_cylinder_height, d=funnel_hollow_cylinder_diameter);
    }
}
}
